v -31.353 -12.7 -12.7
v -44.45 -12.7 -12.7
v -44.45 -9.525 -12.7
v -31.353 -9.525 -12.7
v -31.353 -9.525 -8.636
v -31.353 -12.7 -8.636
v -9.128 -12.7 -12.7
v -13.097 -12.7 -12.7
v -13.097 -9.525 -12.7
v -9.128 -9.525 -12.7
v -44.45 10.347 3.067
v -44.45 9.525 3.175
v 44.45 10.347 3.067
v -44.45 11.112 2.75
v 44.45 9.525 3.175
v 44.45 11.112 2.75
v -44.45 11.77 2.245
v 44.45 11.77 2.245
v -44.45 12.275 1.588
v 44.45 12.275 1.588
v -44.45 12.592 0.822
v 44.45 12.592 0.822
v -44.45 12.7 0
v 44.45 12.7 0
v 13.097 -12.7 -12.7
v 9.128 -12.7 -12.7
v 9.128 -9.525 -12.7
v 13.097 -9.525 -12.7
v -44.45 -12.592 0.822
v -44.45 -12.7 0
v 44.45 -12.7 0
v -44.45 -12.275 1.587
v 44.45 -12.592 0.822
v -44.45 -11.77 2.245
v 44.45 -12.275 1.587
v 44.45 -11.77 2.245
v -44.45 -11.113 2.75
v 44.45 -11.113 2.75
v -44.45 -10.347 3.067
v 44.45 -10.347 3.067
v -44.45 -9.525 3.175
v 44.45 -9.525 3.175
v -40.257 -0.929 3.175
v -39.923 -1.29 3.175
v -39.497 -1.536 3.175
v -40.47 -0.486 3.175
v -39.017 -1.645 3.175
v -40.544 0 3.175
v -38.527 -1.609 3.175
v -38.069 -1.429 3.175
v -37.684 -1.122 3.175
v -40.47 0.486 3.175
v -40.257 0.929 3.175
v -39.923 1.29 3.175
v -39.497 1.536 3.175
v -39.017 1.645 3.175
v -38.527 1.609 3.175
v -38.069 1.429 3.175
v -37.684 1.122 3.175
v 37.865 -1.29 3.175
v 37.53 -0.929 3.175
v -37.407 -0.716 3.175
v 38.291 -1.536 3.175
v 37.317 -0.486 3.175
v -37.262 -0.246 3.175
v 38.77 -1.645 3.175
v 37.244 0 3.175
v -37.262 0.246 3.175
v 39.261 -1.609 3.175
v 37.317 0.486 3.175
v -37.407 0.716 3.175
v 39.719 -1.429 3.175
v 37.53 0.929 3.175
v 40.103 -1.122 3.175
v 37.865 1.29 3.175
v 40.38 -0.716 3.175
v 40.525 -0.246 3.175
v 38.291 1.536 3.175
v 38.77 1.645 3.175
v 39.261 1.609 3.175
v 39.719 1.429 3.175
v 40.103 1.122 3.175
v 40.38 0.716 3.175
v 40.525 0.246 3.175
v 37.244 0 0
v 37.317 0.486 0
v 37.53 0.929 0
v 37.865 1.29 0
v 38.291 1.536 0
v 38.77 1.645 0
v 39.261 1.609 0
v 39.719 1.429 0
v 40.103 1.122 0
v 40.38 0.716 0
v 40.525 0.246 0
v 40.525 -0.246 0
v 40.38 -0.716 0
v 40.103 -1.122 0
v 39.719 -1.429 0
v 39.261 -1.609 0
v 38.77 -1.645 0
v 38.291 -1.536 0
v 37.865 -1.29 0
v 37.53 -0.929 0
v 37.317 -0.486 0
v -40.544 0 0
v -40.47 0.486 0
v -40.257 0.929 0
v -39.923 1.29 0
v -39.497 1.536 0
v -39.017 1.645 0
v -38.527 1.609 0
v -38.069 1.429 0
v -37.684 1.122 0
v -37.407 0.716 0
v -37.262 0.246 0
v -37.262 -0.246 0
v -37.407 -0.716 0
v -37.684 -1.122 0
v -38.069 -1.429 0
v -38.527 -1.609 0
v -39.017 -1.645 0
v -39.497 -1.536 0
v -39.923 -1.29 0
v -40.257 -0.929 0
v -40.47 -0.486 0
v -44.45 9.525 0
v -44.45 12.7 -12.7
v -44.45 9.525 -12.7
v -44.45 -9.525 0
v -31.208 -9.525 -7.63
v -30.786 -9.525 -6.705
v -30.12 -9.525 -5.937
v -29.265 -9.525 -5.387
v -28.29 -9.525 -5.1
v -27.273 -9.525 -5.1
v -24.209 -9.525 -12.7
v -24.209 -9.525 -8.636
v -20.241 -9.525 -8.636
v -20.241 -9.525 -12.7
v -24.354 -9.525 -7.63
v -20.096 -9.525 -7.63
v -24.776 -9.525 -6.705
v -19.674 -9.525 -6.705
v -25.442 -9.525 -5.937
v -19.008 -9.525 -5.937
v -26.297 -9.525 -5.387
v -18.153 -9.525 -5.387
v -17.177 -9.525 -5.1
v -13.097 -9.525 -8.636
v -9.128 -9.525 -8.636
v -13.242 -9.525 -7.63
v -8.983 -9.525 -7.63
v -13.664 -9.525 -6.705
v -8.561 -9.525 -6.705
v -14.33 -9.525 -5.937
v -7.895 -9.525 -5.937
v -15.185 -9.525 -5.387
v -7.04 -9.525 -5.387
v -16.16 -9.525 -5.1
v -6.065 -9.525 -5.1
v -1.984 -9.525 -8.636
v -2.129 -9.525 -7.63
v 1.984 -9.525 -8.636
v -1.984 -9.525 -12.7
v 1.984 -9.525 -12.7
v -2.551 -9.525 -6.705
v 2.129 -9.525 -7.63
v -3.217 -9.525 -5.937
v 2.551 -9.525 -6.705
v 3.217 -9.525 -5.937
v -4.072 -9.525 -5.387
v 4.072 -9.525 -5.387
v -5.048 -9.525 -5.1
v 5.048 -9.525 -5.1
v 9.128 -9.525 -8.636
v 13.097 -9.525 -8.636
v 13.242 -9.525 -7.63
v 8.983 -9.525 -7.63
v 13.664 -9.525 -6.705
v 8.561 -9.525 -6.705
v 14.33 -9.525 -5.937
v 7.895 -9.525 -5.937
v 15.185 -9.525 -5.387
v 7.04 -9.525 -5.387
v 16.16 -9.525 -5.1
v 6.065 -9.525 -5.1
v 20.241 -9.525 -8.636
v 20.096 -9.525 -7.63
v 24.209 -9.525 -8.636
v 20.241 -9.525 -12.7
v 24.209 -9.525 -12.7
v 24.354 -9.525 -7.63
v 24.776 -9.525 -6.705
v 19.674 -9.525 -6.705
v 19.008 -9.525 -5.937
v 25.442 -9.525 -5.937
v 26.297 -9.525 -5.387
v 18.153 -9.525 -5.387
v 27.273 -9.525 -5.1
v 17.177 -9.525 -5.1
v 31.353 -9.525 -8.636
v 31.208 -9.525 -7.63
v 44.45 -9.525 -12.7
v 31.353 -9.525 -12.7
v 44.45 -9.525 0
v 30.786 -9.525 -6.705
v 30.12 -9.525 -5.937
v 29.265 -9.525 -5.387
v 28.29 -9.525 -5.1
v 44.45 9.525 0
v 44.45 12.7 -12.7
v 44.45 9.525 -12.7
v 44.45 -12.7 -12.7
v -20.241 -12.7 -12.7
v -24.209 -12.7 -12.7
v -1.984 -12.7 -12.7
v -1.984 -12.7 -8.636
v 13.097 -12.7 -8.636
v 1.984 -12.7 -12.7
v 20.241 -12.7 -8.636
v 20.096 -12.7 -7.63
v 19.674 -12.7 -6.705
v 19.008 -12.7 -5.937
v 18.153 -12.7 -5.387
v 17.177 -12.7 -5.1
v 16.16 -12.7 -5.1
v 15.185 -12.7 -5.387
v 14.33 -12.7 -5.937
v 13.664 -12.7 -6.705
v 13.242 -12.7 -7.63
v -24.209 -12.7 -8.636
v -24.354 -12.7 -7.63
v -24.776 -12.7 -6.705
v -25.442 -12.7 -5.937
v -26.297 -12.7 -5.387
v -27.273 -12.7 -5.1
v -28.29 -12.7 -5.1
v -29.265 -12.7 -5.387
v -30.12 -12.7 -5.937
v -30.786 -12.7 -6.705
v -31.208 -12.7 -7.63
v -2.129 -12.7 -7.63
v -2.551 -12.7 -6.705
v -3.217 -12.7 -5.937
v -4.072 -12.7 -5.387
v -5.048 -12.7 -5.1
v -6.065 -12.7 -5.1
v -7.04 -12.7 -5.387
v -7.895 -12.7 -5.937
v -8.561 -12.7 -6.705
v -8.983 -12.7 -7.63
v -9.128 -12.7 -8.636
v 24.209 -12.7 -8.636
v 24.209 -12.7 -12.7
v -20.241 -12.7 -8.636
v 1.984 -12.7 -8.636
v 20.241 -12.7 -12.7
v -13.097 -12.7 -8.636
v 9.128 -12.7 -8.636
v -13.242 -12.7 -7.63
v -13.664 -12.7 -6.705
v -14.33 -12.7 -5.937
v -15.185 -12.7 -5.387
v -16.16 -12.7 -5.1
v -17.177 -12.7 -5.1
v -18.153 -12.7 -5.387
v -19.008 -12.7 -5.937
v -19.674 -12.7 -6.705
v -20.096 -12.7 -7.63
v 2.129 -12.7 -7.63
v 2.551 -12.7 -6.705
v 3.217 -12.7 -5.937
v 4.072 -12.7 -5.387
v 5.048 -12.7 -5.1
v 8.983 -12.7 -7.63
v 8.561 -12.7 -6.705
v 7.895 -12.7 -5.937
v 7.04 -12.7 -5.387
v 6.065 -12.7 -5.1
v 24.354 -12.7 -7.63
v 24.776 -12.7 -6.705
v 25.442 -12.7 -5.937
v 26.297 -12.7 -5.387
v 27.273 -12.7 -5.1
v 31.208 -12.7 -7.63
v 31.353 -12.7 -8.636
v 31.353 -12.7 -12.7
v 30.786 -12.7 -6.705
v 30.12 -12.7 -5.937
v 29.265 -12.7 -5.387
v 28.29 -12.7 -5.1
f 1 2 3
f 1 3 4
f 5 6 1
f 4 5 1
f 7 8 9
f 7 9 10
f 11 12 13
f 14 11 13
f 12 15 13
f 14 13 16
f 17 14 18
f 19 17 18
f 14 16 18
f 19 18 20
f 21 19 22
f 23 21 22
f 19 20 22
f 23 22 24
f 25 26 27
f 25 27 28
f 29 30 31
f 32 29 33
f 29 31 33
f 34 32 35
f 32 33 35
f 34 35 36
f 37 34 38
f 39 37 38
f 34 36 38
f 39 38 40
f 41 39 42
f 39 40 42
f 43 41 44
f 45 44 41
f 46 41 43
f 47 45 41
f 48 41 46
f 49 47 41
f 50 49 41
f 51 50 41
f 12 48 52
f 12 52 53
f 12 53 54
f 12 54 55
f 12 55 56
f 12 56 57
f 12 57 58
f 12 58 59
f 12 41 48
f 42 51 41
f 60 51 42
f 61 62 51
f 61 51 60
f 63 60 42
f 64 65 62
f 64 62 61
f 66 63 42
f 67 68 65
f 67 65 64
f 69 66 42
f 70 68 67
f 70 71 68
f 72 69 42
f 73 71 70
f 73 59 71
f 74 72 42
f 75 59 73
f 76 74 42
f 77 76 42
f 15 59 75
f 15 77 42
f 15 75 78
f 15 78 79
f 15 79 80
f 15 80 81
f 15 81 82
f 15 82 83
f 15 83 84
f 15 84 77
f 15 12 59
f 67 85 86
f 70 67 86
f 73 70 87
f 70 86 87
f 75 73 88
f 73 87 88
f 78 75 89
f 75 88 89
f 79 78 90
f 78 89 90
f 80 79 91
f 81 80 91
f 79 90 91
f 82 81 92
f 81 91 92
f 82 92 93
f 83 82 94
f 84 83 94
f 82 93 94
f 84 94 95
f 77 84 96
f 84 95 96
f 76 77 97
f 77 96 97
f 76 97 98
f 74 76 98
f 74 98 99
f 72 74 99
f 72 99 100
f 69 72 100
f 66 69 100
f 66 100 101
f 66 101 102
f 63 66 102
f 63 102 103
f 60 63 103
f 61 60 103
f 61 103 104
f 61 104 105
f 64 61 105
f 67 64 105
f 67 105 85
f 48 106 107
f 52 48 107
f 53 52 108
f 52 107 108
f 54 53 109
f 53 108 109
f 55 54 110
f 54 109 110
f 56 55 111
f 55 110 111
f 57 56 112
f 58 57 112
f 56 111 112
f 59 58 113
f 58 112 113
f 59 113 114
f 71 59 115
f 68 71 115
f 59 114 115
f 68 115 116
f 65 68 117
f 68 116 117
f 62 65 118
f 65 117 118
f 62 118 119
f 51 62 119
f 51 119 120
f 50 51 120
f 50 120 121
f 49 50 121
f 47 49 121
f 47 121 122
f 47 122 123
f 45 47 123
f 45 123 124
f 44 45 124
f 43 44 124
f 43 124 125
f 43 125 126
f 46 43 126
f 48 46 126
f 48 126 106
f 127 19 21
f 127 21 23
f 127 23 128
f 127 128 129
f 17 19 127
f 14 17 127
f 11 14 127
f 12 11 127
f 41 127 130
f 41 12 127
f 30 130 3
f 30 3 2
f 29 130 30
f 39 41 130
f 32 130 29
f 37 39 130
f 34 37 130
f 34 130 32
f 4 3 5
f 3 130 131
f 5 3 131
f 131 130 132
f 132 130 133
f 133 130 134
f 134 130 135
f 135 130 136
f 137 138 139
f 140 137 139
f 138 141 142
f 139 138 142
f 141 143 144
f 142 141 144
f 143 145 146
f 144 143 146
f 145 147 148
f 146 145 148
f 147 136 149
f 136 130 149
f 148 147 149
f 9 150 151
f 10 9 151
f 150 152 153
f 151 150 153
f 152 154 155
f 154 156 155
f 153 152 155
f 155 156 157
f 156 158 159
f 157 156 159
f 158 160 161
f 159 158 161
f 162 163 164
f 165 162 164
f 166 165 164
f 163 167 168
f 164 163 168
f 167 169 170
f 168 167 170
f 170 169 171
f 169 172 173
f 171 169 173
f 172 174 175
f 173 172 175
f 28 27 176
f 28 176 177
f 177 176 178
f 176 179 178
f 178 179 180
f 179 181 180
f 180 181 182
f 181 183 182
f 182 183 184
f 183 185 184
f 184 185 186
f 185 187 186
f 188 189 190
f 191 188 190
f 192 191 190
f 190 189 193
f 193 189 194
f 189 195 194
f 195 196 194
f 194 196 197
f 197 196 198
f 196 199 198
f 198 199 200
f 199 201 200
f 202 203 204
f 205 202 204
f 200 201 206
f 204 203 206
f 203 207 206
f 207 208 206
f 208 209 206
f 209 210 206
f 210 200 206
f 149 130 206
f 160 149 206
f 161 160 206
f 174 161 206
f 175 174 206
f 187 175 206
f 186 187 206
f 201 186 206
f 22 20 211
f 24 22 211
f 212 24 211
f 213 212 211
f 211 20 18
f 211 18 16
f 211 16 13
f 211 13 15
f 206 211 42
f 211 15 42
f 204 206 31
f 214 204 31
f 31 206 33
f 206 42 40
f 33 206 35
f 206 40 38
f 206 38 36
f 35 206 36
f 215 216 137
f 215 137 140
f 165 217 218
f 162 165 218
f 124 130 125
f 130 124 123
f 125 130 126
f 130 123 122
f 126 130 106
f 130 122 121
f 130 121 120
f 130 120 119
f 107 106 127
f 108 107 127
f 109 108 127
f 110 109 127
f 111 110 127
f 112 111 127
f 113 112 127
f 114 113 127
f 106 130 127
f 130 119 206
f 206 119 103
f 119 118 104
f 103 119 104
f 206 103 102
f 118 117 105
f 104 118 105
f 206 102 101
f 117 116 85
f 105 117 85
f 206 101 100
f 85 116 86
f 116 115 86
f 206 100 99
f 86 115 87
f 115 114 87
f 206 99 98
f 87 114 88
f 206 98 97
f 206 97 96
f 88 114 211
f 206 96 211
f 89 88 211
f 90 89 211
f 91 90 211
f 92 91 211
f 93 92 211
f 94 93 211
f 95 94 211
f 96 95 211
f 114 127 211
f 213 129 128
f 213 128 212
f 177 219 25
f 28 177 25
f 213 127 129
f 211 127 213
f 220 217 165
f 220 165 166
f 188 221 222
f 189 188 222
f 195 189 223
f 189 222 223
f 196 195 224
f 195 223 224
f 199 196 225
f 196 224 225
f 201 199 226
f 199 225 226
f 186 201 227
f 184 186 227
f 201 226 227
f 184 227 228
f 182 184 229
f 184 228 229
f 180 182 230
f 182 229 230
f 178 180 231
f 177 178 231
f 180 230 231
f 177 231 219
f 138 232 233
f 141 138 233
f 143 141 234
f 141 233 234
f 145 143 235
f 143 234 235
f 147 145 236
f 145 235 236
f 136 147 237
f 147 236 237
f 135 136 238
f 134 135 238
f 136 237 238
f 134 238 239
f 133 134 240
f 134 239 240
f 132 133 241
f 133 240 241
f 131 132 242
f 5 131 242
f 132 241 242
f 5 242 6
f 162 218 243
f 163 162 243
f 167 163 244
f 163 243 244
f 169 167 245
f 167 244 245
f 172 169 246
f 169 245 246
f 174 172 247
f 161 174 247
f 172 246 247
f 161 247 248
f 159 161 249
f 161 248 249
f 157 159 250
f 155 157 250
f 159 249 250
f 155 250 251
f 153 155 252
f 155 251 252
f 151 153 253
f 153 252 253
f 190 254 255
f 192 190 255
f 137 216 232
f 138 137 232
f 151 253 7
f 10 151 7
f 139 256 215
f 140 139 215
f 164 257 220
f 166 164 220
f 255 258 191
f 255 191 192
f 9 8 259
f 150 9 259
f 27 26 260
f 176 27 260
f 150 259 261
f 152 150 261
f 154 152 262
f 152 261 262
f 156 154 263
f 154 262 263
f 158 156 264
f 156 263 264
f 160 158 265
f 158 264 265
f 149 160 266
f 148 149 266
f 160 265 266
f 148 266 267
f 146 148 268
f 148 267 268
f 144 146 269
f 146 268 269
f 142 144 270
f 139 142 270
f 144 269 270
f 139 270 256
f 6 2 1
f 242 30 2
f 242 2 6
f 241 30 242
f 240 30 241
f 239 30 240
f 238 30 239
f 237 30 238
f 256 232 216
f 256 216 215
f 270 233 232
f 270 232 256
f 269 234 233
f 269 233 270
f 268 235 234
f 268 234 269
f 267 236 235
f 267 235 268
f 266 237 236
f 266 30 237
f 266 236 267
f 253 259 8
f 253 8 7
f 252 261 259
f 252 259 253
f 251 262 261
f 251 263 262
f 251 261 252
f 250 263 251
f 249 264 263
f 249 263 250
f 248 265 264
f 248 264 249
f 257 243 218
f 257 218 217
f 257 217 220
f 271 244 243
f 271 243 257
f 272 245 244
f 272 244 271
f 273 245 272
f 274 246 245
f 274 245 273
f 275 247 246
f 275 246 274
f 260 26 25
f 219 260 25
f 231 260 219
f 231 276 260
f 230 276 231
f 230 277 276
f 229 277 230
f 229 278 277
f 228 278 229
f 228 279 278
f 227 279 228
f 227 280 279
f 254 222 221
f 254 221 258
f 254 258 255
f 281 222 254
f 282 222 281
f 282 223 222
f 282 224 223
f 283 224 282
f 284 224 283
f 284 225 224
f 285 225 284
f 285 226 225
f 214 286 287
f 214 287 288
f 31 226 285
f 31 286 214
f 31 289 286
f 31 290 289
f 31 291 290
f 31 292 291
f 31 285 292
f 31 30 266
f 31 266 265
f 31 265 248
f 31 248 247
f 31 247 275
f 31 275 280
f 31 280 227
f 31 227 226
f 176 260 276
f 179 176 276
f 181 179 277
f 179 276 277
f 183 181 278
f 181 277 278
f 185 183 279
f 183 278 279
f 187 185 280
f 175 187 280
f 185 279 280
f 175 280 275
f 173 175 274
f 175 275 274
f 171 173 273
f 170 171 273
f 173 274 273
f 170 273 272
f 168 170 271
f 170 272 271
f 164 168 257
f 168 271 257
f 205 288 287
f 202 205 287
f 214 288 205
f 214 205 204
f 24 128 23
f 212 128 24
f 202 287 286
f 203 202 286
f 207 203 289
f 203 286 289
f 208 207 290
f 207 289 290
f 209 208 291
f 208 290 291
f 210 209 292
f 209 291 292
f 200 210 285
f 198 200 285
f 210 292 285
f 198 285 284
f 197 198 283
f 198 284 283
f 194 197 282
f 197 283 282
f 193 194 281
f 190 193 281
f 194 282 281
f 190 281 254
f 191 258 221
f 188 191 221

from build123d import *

# Parameters (mm, degrees)
F0_W     = 88.9
F0_H     = 25.4
F1_DEPTH = 3.175
F2_W     = 88.9
F2_H     = 3.175
F3_DEPTH = 12.7
F5_D     = 3.3
F7_DEPTH = 3.175
F8_R     = 3.175


with BuildPart() as f1:
    # F0 (on Top) → F1 (new body)
    with BuildSketch(Plane.XY):
        Rectangle(F0_W, F0_H)
    extrude(amount=F1_DEPTH)

    # F2 (on face) → F3 (join)
    with BuildSketch(Plane(origin=(0, 0, 0), x_dir=(1, 0, 0), z_dir=(0, 0, -1))):
        with Locations((0, 11.1125)):
            Rectangle(F2_W, F2_H)
        with Locations((0, -11.1125)):
            Rectangle(F2_W, F2_H)
    extrude(amount=F3_DEPTH)

    # F5 (through all)
    with Locations(Plane.XY.offset(3.175)):
        with Locations((-38.89375, 0), (38.89375, 0)):
            Hole(F5_D / 2)

    # F6 (on face) → F7 (cut)
    with BuildSketch(Plane.XZ.offset(12.7)):
        with BuildLine():
            Line((-31.353125, -8.636), (-24.209375, -8.636))
            ThreePointArc((-24.209375, -8.636), (-27.78125, -5.064125), (-31.353125, -8.636))
        make_face()
        with BuildLine():
            Line((-24.209375, -12.7), (-24.209375, -8.636))
            ThreePointArc((-24.209375, -8.636), (-27.78125, -12.207875), (-31.353125, -8.636))
            Line((-31.353125, -8.636), (-31.353125, -12.7))
            Line((-31.353125, -12.7), (-24.209375, -12.7))
        make_face()
        with BuildLine():
            ThreePointArc((-31.353125, -8.636), (-27.78125, -12.207875), (-24.209375, -8.636))
            Line((-24.209375, -8.636), (-31.353125, -8.636))
        make_face()
        with BuildLine():
            Line((-20.240625, -8.636), (-13.096875, -8.636))
            ThreePointArc((-13.096875, -8.636), (-16.66875, -5.064125), (-20.240625, -8.636))
        make_face()
        with BuildLine():
            Line((-13.096875, -12.7), (-13.096875, -8.636))
            ThreePointArc((-13.096875, -8.636), (-16.66875, -12.207875), (-20.240625, -8.636))
            Line((-20.240625, -8.636), (-20.240625, -12.7))
            Line((-20.240625, -12.7), (-13.096875, -12.7))
        make_face()
        with BuildLine():
            ThreePointArc((-20.240625, -8.636), (-16.66875, -12.207875), (-13.096875, -8.636))
            Line((-13.096875, -8.636), (-20.240625, -8.636))
        make_face()
        with BuildLine():
            Line((-9.128125, -8.636), (-1.984375, -8.636))
            ThreePointArc((-1.984375, -8.636), (-5.55625, -5.064125), (-9.128125, -8.636))
        make_face()
        with BuildLine():
            Line((-1.984375, -12.7), (-1.984375, -8.636))
            ThreePointArc((-1.984375, -8.636), (-5.55625, -12.207875), (-9.128125, -8.636))
            Line((-9.128125, -8.636), (-9.128125, -12.7))
            Line((-9.128125, -12.7), (-1.984375, -12.7))
        make_face()
        with BuildLine():
            ThreePointArc((-9.128125, -8.636), (-5.55625, -12.207875), (-1.984375, -8.636))
            Line((-1.984375, -8.636), (-9.128125, -8.636))
        make_face()
        with BuildLine():
            Line((1.984375, -8.636), (9.128125, -8.636))
            ThreePointArc((9.128125, -8.636), (5.55625, -5.064125), (1.984375, -8.636))
        make_face()
        with BuildLine():
            Line((9.128125, -12.7), (9.128125, -8.636))
            ThreePointArc((9.128125, -8.636), (5.55625, -12.207875), (1.984375, -8.636))
            Line((1.984375, -8.636), (1.984375, -12.7))
            Line((1.984375, -12.7), (9.128125, -12.7))
        make_face()
        with BuildLine():
            ThreePointArc((1.984375, -8.636), (5.55625, -12.207875), (9.128125, -8.636))
            Line((9.128125, -8.636), (1.984375, -8.636))
        make_face()
        with BuildLine():
            Line((13.096875, -8.636), (20.240625, -8.636))
            ThreePointArc((20.240625, -8.636), (16.66875, -5.064125), (13.096875, -8.636))
        make_face()
        with BuildLine():
            Line((20.240625, -12.7), (20.240625, -8.636))
            ThreePointArc((20.240625, -8.636), (16.66875, -12.207875), (13.096875, -8.636))
            Line((13.096875, -8.636), (13.096875, -12.7))
            Line((13.096875, -12.7), (20.240625, -12.7))
        make_face()
        with BuildLine():
            ThreePointArc((13.096875, -8.636), (16.66875, -12.207875), (20.240625, -8.636))
            Line((20.240625, -8.636), (13.096875, -8.636))
        make_face()
        with BuildLine():
            Line((24.209375, -8.636), (31.353125, -8.636))
            ThreePointArc((31.353125, -8.636), (27.78125, -5.064125), (24.209375, -8.636))
        make_face()
        with BuildLine():
            Line((31.353125, -12.7), (31.353125, -8.636))
            ThreePointArc((31.353125, -8.636), (27.78125, -12.207875), (24.209375, -8.636))
            Line((24.209375, -8.636), (24.209375, -12.7))
            Line((24.209375, -12.7), (31.353125, -12.7))
        make_face()
        with BuildLine():
            ThreePointArc((24.209375, -8.636), (27.78125, -12.207875), (31.353125, -8.636))
            Line((31.353125, -8.636), (24.209375, -8.636))
        make_face()
    extrude(amount=-F7_DEPTH, mode=Mode.SUBTRACT)

    # F8
    f8_edges = [f1.edges().sort_by_distance(p)[0] for p in [
        (0, -12.7, 3.175),
        (0, 12.7, 3.175),
    ]]
    fillet(f8_edges, radius=F8_R)


solid = f1.part
